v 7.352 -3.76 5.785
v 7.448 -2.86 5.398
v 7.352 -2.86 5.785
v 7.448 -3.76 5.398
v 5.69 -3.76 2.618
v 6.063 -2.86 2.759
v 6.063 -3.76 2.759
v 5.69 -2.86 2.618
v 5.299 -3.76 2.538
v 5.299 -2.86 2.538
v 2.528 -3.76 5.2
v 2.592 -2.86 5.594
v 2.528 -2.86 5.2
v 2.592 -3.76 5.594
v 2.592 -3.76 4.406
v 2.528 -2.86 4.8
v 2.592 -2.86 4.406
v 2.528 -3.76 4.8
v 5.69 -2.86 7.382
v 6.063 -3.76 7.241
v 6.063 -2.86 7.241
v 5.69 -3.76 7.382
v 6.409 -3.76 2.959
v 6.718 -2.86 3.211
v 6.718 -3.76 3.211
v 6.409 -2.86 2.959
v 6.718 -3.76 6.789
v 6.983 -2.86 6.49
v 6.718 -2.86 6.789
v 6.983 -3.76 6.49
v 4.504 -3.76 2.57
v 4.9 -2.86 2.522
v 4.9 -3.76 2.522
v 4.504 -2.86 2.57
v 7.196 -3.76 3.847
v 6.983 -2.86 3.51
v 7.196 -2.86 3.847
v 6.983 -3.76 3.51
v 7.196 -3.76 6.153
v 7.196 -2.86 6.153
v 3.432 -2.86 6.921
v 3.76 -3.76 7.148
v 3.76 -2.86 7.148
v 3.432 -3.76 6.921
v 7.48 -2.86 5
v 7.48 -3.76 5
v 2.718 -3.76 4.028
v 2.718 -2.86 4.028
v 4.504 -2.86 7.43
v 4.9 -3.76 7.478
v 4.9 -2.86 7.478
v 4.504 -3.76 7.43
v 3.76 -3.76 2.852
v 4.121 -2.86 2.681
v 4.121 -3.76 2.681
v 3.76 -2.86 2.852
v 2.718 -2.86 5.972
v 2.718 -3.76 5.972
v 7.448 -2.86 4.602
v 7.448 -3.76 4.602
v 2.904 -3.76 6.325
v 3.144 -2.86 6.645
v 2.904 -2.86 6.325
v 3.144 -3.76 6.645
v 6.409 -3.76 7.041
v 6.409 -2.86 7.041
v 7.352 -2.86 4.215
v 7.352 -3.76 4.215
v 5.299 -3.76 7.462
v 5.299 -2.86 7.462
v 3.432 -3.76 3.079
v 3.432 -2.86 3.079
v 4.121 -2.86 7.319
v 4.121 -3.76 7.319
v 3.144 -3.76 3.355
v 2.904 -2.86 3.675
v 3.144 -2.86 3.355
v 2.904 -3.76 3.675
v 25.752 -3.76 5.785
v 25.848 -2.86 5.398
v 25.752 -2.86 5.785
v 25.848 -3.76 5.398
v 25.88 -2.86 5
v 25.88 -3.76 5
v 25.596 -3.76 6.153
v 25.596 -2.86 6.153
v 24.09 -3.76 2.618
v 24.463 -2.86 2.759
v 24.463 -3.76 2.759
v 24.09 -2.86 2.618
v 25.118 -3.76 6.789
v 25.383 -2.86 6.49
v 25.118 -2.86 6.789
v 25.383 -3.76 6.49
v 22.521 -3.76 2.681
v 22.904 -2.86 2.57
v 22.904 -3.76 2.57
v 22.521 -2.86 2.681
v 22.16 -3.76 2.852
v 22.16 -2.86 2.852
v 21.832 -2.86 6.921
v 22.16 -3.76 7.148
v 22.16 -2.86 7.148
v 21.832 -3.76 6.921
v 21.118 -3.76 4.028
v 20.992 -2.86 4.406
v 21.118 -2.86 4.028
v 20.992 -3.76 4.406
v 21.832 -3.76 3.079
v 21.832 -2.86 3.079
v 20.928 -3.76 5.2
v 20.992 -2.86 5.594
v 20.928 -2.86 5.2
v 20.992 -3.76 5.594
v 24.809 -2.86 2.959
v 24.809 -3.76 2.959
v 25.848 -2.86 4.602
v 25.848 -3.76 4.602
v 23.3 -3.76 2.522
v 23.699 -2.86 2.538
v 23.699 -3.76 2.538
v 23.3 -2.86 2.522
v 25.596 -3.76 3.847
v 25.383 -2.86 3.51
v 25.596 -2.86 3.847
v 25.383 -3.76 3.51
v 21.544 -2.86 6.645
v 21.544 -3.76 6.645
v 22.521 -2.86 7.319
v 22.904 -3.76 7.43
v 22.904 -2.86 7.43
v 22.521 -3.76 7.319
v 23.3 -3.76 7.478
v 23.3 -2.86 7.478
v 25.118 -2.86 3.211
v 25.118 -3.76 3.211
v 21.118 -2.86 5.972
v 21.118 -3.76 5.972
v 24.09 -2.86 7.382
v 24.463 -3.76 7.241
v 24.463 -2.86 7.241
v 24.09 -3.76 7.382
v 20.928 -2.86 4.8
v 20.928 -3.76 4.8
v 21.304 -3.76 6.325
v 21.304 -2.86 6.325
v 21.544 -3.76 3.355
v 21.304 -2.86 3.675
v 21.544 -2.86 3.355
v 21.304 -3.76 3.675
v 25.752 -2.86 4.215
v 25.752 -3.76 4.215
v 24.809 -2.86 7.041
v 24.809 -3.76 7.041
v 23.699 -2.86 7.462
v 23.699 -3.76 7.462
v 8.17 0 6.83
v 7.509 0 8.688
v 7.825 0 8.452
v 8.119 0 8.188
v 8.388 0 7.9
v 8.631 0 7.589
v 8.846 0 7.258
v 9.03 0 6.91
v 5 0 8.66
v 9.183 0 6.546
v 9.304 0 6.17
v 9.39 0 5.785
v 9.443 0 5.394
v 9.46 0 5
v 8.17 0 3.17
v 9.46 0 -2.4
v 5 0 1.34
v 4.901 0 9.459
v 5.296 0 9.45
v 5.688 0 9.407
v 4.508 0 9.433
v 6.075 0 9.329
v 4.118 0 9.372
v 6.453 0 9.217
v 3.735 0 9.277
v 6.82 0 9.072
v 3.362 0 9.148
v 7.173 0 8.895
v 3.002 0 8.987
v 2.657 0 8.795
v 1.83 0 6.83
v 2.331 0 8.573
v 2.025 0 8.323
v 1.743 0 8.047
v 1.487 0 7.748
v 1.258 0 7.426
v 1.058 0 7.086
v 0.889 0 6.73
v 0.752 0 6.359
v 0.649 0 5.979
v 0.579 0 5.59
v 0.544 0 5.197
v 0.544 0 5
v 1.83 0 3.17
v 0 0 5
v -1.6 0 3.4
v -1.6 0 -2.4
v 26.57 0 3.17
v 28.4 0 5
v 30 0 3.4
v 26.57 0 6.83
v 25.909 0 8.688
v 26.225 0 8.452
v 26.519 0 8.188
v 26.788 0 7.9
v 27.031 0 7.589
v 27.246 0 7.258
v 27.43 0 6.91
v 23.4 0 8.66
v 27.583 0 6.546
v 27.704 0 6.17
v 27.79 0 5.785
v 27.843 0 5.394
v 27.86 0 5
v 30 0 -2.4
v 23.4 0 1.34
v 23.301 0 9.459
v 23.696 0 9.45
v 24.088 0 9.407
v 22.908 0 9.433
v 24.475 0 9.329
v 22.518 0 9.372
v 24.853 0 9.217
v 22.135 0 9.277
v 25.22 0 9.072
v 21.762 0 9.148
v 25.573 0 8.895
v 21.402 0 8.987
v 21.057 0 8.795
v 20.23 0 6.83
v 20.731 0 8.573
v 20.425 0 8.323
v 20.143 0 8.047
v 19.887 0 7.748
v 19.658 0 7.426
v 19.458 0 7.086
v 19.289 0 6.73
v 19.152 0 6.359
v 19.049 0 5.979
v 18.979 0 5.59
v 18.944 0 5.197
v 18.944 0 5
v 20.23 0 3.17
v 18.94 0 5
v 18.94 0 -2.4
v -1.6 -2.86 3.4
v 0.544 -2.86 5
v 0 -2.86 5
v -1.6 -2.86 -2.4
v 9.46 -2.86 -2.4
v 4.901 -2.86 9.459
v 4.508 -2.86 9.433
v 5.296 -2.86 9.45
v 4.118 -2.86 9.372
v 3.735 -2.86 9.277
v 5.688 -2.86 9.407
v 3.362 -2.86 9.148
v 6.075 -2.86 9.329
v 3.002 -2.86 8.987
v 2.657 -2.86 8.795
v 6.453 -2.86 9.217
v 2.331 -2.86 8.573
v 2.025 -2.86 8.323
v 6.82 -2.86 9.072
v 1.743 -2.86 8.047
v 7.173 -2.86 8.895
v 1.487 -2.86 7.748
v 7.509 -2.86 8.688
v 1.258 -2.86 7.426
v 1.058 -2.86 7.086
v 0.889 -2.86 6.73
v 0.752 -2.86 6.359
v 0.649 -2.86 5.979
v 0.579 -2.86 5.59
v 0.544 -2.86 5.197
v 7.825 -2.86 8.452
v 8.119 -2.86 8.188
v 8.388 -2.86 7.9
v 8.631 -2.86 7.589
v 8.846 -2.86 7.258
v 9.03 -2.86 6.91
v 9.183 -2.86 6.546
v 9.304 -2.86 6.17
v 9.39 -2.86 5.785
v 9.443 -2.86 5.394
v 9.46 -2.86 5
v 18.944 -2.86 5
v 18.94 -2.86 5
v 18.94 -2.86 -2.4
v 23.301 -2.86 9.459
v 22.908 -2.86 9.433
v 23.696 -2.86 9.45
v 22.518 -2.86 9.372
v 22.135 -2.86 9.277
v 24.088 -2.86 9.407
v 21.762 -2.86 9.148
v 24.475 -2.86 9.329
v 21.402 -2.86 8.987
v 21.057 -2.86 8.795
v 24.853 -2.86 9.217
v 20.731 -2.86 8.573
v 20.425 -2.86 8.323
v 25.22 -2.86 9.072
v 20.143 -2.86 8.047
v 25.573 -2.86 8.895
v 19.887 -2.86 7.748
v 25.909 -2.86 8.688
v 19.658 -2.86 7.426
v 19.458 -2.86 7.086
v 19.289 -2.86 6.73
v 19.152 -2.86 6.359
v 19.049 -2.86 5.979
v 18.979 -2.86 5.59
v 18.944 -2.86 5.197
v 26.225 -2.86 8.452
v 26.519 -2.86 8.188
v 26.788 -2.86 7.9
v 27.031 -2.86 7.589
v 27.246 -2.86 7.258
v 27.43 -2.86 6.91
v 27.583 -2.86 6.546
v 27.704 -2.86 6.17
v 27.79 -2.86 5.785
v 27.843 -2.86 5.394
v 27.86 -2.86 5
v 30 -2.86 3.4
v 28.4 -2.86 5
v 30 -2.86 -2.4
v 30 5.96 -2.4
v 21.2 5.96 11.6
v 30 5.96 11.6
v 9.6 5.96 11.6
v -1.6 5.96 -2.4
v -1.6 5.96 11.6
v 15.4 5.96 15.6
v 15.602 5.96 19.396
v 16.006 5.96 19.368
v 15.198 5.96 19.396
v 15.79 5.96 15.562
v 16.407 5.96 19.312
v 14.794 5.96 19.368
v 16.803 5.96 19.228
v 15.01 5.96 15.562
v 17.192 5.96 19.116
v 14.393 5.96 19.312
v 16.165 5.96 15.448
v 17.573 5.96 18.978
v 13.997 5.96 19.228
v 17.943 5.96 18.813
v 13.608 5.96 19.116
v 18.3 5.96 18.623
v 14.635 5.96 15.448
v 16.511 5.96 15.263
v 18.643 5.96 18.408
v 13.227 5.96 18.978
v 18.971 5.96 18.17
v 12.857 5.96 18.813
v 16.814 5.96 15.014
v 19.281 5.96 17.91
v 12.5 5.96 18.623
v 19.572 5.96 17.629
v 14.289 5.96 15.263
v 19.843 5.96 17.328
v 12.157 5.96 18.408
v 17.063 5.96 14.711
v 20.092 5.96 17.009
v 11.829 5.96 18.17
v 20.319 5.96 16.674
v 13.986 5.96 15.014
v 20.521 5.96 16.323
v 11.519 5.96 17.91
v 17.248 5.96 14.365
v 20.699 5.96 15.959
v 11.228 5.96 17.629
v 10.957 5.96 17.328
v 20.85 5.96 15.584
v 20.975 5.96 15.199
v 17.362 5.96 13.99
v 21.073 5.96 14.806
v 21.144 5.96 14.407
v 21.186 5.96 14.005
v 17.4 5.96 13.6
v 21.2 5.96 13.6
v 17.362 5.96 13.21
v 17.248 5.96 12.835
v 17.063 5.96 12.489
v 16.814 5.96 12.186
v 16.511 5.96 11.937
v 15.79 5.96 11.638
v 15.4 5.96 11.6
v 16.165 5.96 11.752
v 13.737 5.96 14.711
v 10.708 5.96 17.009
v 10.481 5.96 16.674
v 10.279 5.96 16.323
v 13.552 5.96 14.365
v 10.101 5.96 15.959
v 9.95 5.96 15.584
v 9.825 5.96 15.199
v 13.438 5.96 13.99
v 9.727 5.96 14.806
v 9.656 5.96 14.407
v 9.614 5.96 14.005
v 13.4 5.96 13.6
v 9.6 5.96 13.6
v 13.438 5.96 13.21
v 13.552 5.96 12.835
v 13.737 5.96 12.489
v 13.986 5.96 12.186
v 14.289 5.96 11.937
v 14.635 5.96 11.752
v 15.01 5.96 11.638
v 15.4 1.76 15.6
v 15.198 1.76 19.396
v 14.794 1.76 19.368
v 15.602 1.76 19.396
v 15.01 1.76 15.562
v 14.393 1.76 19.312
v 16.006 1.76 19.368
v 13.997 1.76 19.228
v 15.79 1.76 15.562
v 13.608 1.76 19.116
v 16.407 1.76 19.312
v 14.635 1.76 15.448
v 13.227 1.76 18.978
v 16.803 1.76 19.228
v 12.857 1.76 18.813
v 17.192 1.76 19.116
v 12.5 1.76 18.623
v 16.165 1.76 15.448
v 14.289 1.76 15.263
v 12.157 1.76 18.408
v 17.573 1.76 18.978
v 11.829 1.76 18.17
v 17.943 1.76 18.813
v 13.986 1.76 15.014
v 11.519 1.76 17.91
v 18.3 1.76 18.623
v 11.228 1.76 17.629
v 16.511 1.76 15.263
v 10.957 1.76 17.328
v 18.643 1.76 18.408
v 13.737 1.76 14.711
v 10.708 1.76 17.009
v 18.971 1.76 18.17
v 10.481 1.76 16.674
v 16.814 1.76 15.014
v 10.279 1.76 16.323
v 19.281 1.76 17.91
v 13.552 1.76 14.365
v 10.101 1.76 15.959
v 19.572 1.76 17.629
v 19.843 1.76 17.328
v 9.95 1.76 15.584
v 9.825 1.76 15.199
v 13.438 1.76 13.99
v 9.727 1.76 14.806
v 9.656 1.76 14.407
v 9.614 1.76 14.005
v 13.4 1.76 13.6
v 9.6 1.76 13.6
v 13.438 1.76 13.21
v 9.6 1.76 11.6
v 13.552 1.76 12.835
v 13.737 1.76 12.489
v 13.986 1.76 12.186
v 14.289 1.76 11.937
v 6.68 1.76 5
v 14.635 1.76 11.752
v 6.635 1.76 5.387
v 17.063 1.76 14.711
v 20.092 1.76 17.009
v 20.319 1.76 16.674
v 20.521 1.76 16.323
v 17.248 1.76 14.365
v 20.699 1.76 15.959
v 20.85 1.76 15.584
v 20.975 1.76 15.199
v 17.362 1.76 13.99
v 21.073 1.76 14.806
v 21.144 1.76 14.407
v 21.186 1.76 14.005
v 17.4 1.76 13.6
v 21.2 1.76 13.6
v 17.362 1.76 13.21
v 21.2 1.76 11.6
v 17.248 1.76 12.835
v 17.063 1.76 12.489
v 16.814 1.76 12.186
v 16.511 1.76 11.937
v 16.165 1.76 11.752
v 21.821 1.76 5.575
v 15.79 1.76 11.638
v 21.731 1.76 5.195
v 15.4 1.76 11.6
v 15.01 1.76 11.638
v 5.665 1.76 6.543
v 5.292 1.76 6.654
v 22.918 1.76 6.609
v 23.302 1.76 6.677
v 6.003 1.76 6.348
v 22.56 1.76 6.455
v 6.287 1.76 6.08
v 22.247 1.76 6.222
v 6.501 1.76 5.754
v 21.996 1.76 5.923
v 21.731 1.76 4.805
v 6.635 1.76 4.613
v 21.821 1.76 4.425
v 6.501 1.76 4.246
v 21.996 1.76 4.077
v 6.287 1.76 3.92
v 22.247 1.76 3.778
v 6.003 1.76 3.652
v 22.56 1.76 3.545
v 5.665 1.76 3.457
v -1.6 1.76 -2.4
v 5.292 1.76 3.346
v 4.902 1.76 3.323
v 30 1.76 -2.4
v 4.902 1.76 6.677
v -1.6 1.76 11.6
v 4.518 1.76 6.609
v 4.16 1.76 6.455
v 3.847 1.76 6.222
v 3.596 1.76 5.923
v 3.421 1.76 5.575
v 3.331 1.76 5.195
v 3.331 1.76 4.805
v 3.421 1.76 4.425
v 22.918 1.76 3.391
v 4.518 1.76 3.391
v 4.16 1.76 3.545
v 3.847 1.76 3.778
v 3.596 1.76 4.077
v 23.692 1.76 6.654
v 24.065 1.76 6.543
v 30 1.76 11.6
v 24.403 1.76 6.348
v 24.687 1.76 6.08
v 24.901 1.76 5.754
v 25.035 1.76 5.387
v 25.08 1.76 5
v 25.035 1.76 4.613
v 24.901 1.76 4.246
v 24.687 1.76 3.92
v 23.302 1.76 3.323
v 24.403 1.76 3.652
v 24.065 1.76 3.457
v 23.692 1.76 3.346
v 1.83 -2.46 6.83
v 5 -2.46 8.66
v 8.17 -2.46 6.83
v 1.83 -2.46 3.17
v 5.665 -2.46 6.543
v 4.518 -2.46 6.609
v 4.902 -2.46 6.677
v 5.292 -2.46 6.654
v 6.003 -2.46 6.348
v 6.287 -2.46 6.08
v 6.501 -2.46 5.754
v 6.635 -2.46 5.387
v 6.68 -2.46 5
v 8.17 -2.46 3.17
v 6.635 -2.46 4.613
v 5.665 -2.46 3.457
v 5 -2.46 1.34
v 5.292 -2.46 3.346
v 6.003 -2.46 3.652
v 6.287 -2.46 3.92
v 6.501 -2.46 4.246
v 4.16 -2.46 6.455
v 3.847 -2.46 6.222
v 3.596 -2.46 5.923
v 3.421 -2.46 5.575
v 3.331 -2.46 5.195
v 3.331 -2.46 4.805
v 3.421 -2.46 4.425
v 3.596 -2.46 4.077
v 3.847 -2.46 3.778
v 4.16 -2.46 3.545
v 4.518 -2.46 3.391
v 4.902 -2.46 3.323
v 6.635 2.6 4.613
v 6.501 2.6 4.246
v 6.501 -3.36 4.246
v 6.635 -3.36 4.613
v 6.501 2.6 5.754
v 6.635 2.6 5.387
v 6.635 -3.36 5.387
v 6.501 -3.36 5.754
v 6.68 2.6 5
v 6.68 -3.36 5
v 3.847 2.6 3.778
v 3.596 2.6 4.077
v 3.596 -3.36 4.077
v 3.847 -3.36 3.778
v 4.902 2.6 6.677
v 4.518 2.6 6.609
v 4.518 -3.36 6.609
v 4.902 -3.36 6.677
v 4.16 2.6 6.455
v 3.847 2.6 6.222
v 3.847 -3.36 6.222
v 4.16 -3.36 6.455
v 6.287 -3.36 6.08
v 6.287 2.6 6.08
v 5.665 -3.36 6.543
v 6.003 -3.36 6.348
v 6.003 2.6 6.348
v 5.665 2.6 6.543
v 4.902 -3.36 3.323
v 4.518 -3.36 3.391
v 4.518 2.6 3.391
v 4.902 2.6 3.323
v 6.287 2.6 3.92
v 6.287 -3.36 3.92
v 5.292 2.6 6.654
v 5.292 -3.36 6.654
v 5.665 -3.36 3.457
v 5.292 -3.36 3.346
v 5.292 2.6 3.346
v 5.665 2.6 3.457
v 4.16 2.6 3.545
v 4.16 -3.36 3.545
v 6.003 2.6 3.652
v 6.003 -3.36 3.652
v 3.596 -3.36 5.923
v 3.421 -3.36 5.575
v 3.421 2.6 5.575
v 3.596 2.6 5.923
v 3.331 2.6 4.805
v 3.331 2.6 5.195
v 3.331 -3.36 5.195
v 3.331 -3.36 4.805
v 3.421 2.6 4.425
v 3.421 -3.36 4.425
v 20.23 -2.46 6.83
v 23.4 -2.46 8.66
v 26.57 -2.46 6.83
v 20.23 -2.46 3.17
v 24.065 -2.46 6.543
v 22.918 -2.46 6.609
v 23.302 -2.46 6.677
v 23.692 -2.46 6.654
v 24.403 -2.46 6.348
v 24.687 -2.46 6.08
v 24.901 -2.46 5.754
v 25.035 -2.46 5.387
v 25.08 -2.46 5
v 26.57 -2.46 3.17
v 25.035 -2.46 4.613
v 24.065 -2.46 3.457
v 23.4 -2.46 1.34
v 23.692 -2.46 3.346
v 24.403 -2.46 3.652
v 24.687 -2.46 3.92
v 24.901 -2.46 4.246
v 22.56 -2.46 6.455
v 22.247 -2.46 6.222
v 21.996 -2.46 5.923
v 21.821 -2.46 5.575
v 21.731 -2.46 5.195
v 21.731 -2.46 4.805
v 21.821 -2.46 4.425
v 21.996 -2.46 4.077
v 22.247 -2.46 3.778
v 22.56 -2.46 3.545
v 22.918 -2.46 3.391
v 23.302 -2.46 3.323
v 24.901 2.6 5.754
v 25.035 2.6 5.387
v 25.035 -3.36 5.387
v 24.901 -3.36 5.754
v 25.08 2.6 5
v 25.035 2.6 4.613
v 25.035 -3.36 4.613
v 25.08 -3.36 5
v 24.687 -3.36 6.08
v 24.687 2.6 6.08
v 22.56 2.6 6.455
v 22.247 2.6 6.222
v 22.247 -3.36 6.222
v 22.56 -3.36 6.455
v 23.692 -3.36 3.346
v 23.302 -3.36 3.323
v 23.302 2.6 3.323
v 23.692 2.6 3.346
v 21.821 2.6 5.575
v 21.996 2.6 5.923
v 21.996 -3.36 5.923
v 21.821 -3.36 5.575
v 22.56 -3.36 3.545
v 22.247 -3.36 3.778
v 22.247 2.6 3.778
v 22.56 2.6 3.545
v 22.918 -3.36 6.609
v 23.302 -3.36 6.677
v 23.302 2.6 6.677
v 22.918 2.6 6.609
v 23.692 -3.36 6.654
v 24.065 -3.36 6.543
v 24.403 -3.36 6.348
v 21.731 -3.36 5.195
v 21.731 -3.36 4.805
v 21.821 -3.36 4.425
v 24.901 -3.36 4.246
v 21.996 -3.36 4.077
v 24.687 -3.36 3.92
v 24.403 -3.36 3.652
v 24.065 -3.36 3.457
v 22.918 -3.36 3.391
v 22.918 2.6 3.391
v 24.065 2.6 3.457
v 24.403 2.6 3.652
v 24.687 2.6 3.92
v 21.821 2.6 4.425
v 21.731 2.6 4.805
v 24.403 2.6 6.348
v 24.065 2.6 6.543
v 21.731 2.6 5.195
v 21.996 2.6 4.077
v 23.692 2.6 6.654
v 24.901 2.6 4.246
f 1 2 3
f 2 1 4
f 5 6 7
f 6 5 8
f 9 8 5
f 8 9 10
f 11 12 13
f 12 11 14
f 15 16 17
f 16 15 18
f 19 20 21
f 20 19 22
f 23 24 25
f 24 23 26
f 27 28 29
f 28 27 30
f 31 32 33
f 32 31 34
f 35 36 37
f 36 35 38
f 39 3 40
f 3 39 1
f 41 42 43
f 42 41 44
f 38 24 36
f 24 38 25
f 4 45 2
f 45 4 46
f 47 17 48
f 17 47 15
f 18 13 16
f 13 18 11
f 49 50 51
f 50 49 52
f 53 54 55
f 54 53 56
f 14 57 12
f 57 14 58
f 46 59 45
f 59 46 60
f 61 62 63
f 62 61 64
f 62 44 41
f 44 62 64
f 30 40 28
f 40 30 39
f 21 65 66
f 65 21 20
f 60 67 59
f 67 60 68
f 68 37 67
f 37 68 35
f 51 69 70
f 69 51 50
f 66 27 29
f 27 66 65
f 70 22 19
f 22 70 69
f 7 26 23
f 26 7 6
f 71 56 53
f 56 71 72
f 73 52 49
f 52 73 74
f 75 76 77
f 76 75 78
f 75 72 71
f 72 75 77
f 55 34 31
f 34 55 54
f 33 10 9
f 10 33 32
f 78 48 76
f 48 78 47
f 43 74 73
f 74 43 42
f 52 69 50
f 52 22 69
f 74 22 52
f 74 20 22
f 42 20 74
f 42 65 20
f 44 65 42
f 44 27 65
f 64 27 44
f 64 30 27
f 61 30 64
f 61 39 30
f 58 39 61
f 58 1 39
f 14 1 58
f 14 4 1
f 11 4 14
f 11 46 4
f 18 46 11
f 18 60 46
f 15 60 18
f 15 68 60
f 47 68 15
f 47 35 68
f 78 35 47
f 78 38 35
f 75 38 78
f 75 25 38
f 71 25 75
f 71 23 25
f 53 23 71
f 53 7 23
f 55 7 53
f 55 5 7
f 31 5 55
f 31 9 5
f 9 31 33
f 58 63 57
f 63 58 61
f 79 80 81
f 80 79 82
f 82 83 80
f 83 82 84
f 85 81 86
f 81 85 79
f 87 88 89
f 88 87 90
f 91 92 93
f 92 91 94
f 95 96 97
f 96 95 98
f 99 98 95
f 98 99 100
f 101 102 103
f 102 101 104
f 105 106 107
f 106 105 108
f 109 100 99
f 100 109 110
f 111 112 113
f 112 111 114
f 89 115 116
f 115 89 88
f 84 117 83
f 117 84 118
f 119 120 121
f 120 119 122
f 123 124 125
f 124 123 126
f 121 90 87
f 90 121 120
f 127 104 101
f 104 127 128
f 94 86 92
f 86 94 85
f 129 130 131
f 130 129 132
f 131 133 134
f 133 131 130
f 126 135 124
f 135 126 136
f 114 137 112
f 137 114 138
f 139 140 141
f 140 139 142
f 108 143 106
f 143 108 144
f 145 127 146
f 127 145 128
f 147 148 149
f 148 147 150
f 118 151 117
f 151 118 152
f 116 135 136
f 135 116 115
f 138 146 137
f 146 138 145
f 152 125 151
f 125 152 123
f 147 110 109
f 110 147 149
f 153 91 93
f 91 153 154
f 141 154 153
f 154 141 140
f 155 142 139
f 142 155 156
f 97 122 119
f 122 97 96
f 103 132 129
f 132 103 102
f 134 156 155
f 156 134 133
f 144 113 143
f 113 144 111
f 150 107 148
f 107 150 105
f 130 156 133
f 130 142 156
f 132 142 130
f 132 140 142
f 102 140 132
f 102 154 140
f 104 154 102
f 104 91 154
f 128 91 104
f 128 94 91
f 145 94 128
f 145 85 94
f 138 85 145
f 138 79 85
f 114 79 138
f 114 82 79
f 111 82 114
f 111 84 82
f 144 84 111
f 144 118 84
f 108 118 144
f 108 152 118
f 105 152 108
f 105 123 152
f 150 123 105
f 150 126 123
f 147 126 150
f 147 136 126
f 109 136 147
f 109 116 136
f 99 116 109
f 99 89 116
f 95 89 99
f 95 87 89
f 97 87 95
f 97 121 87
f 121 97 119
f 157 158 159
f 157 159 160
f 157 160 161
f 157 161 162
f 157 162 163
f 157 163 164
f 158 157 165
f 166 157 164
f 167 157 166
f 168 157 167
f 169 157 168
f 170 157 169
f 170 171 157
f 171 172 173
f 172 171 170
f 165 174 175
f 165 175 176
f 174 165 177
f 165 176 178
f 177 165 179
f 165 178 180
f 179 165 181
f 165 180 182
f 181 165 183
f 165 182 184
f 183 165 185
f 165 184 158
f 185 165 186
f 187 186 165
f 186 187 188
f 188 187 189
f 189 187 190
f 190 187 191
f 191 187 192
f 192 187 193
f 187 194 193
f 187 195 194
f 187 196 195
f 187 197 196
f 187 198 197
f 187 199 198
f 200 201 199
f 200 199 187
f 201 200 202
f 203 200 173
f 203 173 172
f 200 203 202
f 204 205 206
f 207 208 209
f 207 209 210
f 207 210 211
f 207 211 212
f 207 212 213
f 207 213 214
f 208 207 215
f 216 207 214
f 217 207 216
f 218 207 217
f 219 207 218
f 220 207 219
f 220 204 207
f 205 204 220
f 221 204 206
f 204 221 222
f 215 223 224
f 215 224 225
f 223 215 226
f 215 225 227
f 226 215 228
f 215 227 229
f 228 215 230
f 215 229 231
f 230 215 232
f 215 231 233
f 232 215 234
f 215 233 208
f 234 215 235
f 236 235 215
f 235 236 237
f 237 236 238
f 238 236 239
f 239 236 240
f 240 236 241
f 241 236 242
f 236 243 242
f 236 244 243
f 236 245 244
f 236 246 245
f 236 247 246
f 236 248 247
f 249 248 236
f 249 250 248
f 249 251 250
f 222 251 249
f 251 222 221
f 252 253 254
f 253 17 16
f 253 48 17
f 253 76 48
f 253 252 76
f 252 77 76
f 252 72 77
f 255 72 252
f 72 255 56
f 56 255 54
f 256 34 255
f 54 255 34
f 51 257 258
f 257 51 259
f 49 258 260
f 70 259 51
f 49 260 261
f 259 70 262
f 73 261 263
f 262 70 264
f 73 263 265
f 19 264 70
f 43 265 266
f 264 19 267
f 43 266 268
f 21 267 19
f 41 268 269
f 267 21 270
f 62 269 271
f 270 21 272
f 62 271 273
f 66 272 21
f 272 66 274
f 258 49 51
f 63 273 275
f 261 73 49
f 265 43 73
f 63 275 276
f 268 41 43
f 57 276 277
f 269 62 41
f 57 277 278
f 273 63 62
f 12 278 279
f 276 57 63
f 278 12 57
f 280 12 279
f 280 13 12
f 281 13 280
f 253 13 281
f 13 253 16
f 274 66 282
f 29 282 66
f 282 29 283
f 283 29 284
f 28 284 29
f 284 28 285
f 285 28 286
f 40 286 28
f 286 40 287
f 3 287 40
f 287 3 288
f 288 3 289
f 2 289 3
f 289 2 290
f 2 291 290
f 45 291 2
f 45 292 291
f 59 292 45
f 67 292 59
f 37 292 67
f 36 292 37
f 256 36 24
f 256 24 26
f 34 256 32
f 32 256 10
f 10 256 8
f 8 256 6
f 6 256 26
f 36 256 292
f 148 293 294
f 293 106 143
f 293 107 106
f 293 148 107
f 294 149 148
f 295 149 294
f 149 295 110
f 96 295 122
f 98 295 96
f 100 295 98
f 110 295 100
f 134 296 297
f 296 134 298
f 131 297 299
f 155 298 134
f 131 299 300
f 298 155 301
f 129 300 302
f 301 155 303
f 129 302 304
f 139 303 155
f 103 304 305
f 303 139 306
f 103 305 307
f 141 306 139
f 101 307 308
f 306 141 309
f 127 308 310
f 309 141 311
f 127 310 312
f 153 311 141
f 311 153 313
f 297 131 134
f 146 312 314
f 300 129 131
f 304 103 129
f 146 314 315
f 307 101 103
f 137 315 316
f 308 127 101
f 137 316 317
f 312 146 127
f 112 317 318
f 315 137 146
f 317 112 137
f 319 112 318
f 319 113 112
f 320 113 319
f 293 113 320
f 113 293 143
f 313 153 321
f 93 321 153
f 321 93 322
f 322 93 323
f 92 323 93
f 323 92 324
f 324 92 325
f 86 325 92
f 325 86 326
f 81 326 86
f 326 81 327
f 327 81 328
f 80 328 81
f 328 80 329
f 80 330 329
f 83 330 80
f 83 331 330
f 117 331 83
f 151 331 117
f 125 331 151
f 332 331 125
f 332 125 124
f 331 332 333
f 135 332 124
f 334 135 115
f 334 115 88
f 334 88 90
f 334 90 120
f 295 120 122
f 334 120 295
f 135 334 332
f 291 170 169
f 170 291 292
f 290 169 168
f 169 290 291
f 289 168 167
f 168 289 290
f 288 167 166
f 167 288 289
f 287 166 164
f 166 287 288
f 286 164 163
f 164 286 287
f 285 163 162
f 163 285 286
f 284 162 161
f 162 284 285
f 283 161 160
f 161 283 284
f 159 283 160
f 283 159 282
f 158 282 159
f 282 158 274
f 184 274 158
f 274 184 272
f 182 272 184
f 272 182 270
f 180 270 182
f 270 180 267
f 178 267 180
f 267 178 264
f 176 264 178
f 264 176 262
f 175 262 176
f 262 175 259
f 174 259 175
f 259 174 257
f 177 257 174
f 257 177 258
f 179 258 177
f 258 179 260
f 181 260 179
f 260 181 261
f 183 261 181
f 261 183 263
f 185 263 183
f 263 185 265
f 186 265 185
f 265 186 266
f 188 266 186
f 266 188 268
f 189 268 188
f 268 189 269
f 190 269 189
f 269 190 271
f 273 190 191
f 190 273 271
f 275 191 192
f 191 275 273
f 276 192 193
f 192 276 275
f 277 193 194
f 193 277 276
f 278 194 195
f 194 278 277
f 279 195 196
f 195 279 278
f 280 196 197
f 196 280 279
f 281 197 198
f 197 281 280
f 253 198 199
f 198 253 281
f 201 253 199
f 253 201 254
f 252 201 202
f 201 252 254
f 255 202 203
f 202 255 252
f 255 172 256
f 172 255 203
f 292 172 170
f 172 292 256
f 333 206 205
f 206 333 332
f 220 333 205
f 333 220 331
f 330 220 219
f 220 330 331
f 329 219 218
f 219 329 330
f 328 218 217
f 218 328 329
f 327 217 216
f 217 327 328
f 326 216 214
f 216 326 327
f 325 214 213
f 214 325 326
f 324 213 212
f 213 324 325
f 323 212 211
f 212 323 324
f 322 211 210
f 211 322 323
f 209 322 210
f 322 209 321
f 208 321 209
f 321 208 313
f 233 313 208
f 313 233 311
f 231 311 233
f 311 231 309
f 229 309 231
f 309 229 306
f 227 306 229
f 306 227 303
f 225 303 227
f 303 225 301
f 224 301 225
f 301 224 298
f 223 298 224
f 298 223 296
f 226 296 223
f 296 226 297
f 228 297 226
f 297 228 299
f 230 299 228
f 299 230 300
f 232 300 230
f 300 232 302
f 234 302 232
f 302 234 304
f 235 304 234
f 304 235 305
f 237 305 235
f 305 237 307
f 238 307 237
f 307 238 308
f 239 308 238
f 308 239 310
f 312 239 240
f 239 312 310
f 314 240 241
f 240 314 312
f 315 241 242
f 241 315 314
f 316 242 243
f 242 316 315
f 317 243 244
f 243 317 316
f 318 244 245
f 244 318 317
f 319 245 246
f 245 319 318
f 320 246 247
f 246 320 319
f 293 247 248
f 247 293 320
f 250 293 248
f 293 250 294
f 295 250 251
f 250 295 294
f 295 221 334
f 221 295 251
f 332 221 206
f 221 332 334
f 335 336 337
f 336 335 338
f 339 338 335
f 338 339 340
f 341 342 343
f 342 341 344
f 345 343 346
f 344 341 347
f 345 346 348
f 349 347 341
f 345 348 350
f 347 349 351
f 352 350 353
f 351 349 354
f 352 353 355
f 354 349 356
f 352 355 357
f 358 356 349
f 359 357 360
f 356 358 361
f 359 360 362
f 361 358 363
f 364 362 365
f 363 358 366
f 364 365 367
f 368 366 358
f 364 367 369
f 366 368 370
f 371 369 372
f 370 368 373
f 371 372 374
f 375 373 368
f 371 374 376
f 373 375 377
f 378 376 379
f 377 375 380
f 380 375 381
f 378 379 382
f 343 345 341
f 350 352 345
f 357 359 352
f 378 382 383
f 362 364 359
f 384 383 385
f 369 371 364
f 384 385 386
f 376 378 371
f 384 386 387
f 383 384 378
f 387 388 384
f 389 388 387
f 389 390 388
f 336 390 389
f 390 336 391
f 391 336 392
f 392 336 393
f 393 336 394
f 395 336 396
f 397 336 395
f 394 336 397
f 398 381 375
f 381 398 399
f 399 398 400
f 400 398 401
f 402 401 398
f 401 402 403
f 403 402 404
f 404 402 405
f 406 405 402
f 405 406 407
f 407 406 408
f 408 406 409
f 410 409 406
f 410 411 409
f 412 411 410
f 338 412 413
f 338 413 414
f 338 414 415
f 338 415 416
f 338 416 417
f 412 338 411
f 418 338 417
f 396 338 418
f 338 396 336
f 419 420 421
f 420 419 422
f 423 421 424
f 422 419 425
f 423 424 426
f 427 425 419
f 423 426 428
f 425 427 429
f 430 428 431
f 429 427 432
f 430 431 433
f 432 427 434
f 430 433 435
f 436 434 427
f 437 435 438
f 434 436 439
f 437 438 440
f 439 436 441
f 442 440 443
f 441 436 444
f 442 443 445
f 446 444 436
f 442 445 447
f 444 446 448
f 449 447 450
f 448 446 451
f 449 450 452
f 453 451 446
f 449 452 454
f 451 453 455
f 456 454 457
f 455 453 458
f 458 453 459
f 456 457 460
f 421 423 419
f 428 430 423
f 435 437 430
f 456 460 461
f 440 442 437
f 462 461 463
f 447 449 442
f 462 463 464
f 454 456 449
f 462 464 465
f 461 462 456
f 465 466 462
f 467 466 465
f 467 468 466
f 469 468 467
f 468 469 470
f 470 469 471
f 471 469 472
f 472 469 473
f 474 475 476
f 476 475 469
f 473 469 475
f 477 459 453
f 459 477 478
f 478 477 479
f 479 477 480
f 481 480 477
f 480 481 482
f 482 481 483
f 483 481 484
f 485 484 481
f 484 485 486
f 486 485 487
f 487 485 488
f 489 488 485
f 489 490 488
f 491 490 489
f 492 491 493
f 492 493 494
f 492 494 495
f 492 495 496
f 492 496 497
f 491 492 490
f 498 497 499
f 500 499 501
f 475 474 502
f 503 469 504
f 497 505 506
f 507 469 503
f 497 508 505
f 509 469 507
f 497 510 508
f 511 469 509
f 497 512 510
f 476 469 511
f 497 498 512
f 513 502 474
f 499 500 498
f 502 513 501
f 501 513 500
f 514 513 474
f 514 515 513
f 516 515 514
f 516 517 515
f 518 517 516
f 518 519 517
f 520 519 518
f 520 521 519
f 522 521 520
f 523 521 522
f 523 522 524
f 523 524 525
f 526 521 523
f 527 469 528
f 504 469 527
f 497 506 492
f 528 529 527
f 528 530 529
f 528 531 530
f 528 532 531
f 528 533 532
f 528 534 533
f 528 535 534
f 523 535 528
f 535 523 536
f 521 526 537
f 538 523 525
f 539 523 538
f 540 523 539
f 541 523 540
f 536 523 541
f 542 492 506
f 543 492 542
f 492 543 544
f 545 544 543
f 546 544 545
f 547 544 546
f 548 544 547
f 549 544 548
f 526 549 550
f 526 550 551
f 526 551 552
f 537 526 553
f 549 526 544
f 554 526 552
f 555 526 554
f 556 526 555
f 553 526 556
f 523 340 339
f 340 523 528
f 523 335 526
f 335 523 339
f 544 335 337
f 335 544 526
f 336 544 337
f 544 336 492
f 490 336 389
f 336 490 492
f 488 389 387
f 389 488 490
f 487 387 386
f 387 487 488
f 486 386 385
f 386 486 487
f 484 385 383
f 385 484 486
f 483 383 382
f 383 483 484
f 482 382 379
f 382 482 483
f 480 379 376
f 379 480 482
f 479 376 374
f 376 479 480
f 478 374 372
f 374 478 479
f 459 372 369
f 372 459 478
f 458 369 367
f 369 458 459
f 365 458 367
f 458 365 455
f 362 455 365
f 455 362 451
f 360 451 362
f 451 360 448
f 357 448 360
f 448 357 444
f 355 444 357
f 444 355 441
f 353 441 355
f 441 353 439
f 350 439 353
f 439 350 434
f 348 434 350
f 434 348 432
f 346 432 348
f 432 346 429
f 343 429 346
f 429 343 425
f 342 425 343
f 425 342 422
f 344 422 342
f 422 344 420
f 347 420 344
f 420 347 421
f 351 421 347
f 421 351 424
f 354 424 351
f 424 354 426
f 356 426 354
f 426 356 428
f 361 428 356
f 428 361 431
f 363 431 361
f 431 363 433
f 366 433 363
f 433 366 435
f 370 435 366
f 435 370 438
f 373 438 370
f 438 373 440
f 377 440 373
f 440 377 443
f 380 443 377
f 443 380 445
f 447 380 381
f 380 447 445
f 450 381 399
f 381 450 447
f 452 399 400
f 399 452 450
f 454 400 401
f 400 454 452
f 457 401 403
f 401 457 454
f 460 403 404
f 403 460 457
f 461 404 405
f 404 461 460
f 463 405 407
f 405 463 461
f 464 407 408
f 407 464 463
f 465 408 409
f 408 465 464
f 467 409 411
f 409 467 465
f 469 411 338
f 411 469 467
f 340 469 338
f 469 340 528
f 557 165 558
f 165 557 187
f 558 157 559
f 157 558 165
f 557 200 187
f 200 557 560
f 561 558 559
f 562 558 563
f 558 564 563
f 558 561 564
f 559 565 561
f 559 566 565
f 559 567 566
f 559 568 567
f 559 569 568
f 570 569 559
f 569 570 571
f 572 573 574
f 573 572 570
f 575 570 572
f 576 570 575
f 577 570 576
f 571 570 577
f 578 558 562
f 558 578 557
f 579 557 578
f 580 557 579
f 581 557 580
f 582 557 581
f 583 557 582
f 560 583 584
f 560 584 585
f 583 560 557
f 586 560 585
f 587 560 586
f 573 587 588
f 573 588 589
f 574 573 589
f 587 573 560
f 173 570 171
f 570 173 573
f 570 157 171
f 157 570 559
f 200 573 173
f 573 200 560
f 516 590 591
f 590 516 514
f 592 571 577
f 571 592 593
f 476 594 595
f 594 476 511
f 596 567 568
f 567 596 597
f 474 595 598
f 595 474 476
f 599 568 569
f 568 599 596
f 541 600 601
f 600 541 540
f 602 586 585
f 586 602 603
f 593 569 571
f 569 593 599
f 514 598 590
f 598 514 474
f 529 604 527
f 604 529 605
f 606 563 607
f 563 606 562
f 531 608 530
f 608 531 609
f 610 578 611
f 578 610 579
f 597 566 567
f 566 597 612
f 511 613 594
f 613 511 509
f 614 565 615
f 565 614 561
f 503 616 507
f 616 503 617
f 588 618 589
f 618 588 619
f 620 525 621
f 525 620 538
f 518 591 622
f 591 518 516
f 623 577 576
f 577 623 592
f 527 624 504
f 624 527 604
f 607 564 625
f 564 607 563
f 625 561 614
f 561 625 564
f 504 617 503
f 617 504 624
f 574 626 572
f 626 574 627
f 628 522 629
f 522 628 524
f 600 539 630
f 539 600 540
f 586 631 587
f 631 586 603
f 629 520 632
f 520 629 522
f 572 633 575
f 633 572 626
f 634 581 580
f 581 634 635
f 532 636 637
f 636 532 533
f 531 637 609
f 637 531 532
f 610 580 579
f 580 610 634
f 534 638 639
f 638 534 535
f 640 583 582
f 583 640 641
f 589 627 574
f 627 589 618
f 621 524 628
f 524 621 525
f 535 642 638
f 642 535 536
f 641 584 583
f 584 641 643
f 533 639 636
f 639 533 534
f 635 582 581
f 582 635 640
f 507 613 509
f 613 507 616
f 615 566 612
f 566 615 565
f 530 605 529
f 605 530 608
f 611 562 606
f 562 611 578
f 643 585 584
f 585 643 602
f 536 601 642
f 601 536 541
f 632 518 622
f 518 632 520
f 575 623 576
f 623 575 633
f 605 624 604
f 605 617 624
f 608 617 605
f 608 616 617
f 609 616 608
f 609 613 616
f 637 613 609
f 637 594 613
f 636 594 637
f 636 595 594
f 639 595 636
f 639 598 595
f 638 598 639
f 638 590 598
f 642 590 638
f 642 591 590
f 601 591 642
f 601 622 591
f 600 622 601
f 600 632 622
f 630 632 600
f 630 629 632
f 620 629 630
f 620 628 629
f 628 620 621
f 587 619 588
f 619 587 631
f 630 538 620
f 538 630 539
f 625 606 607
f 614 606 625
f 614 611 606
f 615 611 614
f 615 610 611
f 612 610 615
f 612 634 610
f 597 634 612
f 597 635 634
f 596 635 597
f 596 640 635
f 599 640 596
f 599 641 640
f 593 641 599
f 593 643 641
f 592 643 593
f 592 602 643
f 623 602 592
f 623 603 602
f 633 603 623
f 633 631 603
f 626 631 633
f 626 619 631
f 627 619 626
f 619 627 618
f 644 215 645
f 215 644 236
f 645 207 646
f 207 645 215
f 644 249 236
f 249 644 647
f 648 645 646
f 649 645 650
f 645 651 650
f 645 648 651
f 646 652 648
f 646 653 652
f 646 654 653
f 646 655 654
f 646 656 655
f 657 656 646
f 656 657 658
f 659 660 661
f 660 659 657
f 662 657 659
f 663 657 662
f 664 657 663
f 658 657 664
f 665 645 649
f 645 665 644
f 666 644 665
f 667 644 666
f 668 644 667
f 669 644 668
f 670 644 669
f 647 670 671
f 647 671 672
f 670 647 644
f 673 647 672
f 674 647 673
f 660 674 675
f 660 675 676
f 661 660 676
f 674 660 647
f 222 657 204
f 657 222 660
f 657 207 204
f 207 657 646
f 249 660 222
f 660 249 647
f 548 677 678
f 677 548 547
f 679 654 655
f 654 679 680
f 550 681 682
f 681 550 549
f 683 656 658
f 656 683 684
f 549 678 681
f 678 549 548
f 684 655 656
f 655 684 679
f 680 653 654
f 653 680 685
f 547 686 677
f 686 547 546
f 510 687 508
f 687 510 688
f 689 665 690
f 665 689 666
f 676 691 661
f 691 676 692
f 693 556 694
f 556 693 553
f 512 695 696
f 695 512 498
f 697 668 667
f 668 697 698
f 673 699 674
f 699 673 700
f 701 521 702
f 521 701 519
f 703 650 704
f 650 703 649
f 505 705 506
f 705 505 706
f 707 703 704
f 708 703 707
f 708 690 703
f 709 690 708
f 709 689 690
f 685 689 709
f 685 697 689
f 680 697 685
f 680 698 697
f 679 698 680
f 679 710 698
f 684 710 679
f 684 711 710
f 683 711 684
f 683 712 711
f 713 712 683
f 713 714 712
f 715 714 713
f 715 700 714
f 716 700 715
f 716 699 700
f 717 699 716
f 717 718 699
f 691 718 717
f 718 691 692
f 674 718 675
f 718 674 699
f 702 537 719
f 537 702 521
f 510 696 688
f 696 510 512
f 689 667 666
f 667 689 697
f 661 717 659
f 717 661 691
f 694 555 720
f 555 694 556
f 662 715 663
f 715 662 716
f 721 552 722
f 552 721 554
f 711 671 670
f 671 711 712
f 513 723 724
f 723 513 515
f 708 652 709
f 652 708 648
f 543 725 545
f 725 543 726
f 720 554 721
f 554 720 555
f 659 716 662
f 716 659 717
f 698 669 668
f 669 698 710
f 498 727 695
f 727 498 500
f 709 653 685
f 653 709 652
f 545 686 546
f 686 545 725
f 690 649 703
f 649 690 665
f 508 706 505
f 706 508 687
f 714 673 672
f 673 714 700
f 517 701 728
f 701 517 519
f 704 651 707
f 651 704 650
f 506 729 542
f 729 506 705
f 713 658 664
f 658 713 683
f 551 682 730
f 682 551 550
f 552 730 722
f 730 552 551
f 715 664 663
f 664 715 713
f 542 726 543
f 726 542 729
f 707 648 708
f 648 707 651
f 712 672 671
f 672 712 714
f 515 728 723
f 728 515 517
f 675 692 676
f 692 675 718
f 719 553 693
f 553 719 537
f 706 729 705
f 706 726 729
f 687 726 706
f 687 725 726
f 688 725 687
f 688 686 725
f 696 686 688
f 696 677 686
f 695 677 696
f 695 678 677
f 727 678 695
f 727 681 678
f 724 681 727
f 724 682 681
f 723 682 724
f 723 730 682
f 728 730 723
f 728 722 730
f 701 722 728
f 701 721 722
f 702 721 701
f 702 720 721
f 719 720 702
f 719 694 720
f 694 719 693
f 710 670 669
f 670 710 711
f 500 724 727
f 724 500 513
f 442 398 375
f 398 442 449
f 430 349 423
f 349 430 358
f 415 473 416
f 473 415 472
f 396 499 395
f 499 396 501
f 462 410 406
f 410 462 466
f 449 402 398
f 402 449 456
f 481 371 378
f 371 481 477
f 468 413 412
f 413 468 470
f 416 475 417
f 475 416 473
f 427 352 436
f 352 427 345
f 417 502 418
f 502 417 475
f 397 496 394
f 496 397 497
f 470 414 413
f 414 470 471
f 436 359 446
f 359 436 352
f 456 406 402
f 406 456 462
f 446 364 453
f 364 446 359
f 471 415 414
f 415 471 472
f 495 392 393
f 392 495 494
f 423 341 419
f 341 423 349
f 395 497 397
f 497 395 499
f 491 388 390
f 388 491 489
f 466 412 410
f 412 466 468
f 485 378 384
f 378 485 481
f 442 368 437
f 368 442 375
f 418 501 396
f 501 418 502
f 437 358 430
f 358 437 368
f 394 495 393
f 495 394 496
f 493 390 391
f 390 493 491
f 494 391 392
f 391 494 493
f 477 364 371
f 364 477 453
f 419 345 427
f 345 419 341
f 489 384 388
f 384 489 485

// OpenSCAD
// Copyright (C) 2025 Arif K. Rafiq
// This program is free software: you can redistribute it and/or modify
// it under the terms of the GNU General Public License as published by
// the Free Software Foundation, either version 3 of the License, or
// (at your option) any later version.

// This program is distributed in the hope that it will be useful,
// but WITHOUT ANY WARRANTY; without even the implied warranty of
// MERCHANTABILITY or FITNESS FOR A PARTICULAR PURPOSE.  See the
// GNU General Public License for more details.

// You should have received a copy of the GNU General Public License
// along with this file.  If not, see <https://www.gnu.org/licenses/>,
// or write to: license@temperedoptimism.com


/* 
(b)readth       :(w)est (X-)   (c)enter (X0) (e)east (X+)
(h)eight        :(d)own (Z-)   (g)round(Z0)  (u)p (Z+)

Vectors (v)     :(x), (y), (z)
Thicknesses (t) : Thicknesses to resolve 3D printer limits or rendering issues.
Proportion (p)  : container for grouping (r)adius and (i)ntensity into a singl 2d vector acccessed using .x and .y respectively
*/
/* 17:08 */
// Fixed in example3.scad       // Set limits in customizer
/* [Thicknesses (x),(y),(z)] */
tFitGap = [0.16, 0.16, 0.16];   //[0.00:0.01:0.64] 
tWallMin = [0.40, 0.40, 0.16];  //[0.16:0.08:1.60] 
/* [Proportional (x):(Radius, (y):(i)ntensity] */
pHexSink = [3.5, 2.3];          //[0.10:0.02:20.00] 
pFastShaft064 = [1.36, 5.80]; //0.10:0.02:20.00]
pFastShaft095 = [1.36, 9.30]; //0.10:0.02:20.00]
pWashSink = [4.00, 1.00]; //0.10:0.02:20.00]
/* [2D vectors (x), (y)] */
vTerminalW = [5.0, 5.0];     //[0.00:0.10:100] 
vTerminalE = [23.4, 5.0];    //[0.00:0.10:100]
vThermal = [ 15.4, 13.6];    //[0.00:0.10:100.00]
/* [Scalars] */
leadingEdge = 2.4; //[0.8:0.4:5.0]
flankEdge = 1.6; //[0.8:0.4:5.0]
trailingEdge = 1.6; //[0.8:0.4:3.6]
bBoard = 28.4; //[20:0.1:100.0]
hBoard = 1.6; //0.8:04:3.2]
// Adding space
hSpacer = 4.2; //[2.8:0.4:14]
rCorner = 1.6; //0.1
rTerminal = 5.0; //0.1
rThermal = 5.0;  //0.1
/* [Special ] */
fa0 = 4.0;     //[1:1:60]  
fs0 = 0.4;     //[0.1:0.1:4.0]  
fx0 = 3;       //[1,2,3,4,5,6,7,8,9,10]
/* [Hidden] */ 
tEps=0.01; 

/* Calucualted at run time. */
pHexSurround = [pHexSink.x + (tWallMin.x * 2) + tFitGap.x, pHexSink.y + tWallMin.y + tFitGap.y];
pExtension = [pFastShaft064.x + ((tWallMin.x + tFitGap.x)* 2), pFastShaft064.y + tWallMin.y + tFitGap.y - pHexSurround.y -hBoard - pWashSink.y];

//30.00-35.00 Circles, Also look at the customizer!!
// Rotate
rotate([90,0,0]){
  difference(){
    union() {
      // hex pocket surround
      linear_extrude(pHexSurround.y, convexity=fx0){ 
        polygon([[vTerminalW.x + pHexSurround.x, vTerminalW.y],
              [ vTerminalW.x + pHexSurround.x, -leadingEdge],
              [-flankEdge, -leadingEdge],
              [-flankEdge, vTerminalW.y - rCorner],
              [-flankEdge + rCorner, vTerminalW.y]]);
        polygon([[vTerminalE.x - pHexSurround.x, vTerminalE.y],
              [ vTerminalE.x - pHexSurround.x, -leadingEdge],
              [bBoard + flankEdge, -leadingEdge],
              [bBoard + flankEdge, vTerminalE.y - rCorner],
              [bBoard + flankEdge - rCorner, vTerminalE.y]]);       
              
        for(v = [vTerminalW, vTerminalE]){
          translate(v)  circle(pHexSurround.x, $fa=fa0, $fs=fs0 );
        }
      }
      // shaft extension
      for(v= [vTerminalW, vTerminalE]){
          translate([v.x, v.y, pHexSurround.y - tEps]) cylinder(pExtension.y + tEps, r=pExtension.x, $fa=fa0, $fs=fs0);
      }
      // board spacer
      translate([0, 0, -hBoard - tFitGap.y - hSpacer]) linear_extrude(hSpacer, convexity=fx0){
          polygon([[-flankEdge, -leadingEdge],
            [bBoard + flankEdge, -leadingEdge],
            [bBoard + flankEdge, vTerminalE.y + rTerminal + trailingEdge],
            [vThermal.x + rThermal +(tWallMin.x * 2), vTerminalE.y + rTerminal + trailingEdge],
            [vThermal.x + rThermal +(tWallMin.x * 2), vThermal.y],
            [vThermal.x - rThermal -(tWallMin.x * 2), vThermal.y],
           [vThermal.x - rThermal -(tWallMin.x * 2), vTerminalW.y + rTerminal + trailingEdge],
           [-flankEdge, vTerminalW.y + rTerminal + trailingEdge]]);
          translate(vThermal) circle(rThermal + (tWallMin.x * 2), $fa=fa0, $fs=fs0);
      }
          
    }
    for(v = [vTerminalW, vTerminalE]){
        // hex pocket
        #translate([v.x, v.y, -tEps]) rotate([0,0,30]) cylinder(pHexSurround.y - tWallMin.y + tEps, r=pHexSurround.x - (tWallMin.x * 2), $fn=6);
        // fastner hole
        #translate([v.x, v.y, -hBoard -pWashSink.y]) cylinder(pFastShaft064.y + tFitGap.y, r=pFastShaft064.x + (tFitGap.x * 2), $fa=fa0, $fs=fs0);
     
    }
   #translate([vThermal.x, vThermal.y, -hBoard + pWashSink.y]) rotate([0,180,0]) 
        cylinder(pFastShaft095.y + tFitGap.y, r=pFastShaft095.x + (tFitGap.x * 4), $fa=fa0, $fs=fs0);
  }
}
